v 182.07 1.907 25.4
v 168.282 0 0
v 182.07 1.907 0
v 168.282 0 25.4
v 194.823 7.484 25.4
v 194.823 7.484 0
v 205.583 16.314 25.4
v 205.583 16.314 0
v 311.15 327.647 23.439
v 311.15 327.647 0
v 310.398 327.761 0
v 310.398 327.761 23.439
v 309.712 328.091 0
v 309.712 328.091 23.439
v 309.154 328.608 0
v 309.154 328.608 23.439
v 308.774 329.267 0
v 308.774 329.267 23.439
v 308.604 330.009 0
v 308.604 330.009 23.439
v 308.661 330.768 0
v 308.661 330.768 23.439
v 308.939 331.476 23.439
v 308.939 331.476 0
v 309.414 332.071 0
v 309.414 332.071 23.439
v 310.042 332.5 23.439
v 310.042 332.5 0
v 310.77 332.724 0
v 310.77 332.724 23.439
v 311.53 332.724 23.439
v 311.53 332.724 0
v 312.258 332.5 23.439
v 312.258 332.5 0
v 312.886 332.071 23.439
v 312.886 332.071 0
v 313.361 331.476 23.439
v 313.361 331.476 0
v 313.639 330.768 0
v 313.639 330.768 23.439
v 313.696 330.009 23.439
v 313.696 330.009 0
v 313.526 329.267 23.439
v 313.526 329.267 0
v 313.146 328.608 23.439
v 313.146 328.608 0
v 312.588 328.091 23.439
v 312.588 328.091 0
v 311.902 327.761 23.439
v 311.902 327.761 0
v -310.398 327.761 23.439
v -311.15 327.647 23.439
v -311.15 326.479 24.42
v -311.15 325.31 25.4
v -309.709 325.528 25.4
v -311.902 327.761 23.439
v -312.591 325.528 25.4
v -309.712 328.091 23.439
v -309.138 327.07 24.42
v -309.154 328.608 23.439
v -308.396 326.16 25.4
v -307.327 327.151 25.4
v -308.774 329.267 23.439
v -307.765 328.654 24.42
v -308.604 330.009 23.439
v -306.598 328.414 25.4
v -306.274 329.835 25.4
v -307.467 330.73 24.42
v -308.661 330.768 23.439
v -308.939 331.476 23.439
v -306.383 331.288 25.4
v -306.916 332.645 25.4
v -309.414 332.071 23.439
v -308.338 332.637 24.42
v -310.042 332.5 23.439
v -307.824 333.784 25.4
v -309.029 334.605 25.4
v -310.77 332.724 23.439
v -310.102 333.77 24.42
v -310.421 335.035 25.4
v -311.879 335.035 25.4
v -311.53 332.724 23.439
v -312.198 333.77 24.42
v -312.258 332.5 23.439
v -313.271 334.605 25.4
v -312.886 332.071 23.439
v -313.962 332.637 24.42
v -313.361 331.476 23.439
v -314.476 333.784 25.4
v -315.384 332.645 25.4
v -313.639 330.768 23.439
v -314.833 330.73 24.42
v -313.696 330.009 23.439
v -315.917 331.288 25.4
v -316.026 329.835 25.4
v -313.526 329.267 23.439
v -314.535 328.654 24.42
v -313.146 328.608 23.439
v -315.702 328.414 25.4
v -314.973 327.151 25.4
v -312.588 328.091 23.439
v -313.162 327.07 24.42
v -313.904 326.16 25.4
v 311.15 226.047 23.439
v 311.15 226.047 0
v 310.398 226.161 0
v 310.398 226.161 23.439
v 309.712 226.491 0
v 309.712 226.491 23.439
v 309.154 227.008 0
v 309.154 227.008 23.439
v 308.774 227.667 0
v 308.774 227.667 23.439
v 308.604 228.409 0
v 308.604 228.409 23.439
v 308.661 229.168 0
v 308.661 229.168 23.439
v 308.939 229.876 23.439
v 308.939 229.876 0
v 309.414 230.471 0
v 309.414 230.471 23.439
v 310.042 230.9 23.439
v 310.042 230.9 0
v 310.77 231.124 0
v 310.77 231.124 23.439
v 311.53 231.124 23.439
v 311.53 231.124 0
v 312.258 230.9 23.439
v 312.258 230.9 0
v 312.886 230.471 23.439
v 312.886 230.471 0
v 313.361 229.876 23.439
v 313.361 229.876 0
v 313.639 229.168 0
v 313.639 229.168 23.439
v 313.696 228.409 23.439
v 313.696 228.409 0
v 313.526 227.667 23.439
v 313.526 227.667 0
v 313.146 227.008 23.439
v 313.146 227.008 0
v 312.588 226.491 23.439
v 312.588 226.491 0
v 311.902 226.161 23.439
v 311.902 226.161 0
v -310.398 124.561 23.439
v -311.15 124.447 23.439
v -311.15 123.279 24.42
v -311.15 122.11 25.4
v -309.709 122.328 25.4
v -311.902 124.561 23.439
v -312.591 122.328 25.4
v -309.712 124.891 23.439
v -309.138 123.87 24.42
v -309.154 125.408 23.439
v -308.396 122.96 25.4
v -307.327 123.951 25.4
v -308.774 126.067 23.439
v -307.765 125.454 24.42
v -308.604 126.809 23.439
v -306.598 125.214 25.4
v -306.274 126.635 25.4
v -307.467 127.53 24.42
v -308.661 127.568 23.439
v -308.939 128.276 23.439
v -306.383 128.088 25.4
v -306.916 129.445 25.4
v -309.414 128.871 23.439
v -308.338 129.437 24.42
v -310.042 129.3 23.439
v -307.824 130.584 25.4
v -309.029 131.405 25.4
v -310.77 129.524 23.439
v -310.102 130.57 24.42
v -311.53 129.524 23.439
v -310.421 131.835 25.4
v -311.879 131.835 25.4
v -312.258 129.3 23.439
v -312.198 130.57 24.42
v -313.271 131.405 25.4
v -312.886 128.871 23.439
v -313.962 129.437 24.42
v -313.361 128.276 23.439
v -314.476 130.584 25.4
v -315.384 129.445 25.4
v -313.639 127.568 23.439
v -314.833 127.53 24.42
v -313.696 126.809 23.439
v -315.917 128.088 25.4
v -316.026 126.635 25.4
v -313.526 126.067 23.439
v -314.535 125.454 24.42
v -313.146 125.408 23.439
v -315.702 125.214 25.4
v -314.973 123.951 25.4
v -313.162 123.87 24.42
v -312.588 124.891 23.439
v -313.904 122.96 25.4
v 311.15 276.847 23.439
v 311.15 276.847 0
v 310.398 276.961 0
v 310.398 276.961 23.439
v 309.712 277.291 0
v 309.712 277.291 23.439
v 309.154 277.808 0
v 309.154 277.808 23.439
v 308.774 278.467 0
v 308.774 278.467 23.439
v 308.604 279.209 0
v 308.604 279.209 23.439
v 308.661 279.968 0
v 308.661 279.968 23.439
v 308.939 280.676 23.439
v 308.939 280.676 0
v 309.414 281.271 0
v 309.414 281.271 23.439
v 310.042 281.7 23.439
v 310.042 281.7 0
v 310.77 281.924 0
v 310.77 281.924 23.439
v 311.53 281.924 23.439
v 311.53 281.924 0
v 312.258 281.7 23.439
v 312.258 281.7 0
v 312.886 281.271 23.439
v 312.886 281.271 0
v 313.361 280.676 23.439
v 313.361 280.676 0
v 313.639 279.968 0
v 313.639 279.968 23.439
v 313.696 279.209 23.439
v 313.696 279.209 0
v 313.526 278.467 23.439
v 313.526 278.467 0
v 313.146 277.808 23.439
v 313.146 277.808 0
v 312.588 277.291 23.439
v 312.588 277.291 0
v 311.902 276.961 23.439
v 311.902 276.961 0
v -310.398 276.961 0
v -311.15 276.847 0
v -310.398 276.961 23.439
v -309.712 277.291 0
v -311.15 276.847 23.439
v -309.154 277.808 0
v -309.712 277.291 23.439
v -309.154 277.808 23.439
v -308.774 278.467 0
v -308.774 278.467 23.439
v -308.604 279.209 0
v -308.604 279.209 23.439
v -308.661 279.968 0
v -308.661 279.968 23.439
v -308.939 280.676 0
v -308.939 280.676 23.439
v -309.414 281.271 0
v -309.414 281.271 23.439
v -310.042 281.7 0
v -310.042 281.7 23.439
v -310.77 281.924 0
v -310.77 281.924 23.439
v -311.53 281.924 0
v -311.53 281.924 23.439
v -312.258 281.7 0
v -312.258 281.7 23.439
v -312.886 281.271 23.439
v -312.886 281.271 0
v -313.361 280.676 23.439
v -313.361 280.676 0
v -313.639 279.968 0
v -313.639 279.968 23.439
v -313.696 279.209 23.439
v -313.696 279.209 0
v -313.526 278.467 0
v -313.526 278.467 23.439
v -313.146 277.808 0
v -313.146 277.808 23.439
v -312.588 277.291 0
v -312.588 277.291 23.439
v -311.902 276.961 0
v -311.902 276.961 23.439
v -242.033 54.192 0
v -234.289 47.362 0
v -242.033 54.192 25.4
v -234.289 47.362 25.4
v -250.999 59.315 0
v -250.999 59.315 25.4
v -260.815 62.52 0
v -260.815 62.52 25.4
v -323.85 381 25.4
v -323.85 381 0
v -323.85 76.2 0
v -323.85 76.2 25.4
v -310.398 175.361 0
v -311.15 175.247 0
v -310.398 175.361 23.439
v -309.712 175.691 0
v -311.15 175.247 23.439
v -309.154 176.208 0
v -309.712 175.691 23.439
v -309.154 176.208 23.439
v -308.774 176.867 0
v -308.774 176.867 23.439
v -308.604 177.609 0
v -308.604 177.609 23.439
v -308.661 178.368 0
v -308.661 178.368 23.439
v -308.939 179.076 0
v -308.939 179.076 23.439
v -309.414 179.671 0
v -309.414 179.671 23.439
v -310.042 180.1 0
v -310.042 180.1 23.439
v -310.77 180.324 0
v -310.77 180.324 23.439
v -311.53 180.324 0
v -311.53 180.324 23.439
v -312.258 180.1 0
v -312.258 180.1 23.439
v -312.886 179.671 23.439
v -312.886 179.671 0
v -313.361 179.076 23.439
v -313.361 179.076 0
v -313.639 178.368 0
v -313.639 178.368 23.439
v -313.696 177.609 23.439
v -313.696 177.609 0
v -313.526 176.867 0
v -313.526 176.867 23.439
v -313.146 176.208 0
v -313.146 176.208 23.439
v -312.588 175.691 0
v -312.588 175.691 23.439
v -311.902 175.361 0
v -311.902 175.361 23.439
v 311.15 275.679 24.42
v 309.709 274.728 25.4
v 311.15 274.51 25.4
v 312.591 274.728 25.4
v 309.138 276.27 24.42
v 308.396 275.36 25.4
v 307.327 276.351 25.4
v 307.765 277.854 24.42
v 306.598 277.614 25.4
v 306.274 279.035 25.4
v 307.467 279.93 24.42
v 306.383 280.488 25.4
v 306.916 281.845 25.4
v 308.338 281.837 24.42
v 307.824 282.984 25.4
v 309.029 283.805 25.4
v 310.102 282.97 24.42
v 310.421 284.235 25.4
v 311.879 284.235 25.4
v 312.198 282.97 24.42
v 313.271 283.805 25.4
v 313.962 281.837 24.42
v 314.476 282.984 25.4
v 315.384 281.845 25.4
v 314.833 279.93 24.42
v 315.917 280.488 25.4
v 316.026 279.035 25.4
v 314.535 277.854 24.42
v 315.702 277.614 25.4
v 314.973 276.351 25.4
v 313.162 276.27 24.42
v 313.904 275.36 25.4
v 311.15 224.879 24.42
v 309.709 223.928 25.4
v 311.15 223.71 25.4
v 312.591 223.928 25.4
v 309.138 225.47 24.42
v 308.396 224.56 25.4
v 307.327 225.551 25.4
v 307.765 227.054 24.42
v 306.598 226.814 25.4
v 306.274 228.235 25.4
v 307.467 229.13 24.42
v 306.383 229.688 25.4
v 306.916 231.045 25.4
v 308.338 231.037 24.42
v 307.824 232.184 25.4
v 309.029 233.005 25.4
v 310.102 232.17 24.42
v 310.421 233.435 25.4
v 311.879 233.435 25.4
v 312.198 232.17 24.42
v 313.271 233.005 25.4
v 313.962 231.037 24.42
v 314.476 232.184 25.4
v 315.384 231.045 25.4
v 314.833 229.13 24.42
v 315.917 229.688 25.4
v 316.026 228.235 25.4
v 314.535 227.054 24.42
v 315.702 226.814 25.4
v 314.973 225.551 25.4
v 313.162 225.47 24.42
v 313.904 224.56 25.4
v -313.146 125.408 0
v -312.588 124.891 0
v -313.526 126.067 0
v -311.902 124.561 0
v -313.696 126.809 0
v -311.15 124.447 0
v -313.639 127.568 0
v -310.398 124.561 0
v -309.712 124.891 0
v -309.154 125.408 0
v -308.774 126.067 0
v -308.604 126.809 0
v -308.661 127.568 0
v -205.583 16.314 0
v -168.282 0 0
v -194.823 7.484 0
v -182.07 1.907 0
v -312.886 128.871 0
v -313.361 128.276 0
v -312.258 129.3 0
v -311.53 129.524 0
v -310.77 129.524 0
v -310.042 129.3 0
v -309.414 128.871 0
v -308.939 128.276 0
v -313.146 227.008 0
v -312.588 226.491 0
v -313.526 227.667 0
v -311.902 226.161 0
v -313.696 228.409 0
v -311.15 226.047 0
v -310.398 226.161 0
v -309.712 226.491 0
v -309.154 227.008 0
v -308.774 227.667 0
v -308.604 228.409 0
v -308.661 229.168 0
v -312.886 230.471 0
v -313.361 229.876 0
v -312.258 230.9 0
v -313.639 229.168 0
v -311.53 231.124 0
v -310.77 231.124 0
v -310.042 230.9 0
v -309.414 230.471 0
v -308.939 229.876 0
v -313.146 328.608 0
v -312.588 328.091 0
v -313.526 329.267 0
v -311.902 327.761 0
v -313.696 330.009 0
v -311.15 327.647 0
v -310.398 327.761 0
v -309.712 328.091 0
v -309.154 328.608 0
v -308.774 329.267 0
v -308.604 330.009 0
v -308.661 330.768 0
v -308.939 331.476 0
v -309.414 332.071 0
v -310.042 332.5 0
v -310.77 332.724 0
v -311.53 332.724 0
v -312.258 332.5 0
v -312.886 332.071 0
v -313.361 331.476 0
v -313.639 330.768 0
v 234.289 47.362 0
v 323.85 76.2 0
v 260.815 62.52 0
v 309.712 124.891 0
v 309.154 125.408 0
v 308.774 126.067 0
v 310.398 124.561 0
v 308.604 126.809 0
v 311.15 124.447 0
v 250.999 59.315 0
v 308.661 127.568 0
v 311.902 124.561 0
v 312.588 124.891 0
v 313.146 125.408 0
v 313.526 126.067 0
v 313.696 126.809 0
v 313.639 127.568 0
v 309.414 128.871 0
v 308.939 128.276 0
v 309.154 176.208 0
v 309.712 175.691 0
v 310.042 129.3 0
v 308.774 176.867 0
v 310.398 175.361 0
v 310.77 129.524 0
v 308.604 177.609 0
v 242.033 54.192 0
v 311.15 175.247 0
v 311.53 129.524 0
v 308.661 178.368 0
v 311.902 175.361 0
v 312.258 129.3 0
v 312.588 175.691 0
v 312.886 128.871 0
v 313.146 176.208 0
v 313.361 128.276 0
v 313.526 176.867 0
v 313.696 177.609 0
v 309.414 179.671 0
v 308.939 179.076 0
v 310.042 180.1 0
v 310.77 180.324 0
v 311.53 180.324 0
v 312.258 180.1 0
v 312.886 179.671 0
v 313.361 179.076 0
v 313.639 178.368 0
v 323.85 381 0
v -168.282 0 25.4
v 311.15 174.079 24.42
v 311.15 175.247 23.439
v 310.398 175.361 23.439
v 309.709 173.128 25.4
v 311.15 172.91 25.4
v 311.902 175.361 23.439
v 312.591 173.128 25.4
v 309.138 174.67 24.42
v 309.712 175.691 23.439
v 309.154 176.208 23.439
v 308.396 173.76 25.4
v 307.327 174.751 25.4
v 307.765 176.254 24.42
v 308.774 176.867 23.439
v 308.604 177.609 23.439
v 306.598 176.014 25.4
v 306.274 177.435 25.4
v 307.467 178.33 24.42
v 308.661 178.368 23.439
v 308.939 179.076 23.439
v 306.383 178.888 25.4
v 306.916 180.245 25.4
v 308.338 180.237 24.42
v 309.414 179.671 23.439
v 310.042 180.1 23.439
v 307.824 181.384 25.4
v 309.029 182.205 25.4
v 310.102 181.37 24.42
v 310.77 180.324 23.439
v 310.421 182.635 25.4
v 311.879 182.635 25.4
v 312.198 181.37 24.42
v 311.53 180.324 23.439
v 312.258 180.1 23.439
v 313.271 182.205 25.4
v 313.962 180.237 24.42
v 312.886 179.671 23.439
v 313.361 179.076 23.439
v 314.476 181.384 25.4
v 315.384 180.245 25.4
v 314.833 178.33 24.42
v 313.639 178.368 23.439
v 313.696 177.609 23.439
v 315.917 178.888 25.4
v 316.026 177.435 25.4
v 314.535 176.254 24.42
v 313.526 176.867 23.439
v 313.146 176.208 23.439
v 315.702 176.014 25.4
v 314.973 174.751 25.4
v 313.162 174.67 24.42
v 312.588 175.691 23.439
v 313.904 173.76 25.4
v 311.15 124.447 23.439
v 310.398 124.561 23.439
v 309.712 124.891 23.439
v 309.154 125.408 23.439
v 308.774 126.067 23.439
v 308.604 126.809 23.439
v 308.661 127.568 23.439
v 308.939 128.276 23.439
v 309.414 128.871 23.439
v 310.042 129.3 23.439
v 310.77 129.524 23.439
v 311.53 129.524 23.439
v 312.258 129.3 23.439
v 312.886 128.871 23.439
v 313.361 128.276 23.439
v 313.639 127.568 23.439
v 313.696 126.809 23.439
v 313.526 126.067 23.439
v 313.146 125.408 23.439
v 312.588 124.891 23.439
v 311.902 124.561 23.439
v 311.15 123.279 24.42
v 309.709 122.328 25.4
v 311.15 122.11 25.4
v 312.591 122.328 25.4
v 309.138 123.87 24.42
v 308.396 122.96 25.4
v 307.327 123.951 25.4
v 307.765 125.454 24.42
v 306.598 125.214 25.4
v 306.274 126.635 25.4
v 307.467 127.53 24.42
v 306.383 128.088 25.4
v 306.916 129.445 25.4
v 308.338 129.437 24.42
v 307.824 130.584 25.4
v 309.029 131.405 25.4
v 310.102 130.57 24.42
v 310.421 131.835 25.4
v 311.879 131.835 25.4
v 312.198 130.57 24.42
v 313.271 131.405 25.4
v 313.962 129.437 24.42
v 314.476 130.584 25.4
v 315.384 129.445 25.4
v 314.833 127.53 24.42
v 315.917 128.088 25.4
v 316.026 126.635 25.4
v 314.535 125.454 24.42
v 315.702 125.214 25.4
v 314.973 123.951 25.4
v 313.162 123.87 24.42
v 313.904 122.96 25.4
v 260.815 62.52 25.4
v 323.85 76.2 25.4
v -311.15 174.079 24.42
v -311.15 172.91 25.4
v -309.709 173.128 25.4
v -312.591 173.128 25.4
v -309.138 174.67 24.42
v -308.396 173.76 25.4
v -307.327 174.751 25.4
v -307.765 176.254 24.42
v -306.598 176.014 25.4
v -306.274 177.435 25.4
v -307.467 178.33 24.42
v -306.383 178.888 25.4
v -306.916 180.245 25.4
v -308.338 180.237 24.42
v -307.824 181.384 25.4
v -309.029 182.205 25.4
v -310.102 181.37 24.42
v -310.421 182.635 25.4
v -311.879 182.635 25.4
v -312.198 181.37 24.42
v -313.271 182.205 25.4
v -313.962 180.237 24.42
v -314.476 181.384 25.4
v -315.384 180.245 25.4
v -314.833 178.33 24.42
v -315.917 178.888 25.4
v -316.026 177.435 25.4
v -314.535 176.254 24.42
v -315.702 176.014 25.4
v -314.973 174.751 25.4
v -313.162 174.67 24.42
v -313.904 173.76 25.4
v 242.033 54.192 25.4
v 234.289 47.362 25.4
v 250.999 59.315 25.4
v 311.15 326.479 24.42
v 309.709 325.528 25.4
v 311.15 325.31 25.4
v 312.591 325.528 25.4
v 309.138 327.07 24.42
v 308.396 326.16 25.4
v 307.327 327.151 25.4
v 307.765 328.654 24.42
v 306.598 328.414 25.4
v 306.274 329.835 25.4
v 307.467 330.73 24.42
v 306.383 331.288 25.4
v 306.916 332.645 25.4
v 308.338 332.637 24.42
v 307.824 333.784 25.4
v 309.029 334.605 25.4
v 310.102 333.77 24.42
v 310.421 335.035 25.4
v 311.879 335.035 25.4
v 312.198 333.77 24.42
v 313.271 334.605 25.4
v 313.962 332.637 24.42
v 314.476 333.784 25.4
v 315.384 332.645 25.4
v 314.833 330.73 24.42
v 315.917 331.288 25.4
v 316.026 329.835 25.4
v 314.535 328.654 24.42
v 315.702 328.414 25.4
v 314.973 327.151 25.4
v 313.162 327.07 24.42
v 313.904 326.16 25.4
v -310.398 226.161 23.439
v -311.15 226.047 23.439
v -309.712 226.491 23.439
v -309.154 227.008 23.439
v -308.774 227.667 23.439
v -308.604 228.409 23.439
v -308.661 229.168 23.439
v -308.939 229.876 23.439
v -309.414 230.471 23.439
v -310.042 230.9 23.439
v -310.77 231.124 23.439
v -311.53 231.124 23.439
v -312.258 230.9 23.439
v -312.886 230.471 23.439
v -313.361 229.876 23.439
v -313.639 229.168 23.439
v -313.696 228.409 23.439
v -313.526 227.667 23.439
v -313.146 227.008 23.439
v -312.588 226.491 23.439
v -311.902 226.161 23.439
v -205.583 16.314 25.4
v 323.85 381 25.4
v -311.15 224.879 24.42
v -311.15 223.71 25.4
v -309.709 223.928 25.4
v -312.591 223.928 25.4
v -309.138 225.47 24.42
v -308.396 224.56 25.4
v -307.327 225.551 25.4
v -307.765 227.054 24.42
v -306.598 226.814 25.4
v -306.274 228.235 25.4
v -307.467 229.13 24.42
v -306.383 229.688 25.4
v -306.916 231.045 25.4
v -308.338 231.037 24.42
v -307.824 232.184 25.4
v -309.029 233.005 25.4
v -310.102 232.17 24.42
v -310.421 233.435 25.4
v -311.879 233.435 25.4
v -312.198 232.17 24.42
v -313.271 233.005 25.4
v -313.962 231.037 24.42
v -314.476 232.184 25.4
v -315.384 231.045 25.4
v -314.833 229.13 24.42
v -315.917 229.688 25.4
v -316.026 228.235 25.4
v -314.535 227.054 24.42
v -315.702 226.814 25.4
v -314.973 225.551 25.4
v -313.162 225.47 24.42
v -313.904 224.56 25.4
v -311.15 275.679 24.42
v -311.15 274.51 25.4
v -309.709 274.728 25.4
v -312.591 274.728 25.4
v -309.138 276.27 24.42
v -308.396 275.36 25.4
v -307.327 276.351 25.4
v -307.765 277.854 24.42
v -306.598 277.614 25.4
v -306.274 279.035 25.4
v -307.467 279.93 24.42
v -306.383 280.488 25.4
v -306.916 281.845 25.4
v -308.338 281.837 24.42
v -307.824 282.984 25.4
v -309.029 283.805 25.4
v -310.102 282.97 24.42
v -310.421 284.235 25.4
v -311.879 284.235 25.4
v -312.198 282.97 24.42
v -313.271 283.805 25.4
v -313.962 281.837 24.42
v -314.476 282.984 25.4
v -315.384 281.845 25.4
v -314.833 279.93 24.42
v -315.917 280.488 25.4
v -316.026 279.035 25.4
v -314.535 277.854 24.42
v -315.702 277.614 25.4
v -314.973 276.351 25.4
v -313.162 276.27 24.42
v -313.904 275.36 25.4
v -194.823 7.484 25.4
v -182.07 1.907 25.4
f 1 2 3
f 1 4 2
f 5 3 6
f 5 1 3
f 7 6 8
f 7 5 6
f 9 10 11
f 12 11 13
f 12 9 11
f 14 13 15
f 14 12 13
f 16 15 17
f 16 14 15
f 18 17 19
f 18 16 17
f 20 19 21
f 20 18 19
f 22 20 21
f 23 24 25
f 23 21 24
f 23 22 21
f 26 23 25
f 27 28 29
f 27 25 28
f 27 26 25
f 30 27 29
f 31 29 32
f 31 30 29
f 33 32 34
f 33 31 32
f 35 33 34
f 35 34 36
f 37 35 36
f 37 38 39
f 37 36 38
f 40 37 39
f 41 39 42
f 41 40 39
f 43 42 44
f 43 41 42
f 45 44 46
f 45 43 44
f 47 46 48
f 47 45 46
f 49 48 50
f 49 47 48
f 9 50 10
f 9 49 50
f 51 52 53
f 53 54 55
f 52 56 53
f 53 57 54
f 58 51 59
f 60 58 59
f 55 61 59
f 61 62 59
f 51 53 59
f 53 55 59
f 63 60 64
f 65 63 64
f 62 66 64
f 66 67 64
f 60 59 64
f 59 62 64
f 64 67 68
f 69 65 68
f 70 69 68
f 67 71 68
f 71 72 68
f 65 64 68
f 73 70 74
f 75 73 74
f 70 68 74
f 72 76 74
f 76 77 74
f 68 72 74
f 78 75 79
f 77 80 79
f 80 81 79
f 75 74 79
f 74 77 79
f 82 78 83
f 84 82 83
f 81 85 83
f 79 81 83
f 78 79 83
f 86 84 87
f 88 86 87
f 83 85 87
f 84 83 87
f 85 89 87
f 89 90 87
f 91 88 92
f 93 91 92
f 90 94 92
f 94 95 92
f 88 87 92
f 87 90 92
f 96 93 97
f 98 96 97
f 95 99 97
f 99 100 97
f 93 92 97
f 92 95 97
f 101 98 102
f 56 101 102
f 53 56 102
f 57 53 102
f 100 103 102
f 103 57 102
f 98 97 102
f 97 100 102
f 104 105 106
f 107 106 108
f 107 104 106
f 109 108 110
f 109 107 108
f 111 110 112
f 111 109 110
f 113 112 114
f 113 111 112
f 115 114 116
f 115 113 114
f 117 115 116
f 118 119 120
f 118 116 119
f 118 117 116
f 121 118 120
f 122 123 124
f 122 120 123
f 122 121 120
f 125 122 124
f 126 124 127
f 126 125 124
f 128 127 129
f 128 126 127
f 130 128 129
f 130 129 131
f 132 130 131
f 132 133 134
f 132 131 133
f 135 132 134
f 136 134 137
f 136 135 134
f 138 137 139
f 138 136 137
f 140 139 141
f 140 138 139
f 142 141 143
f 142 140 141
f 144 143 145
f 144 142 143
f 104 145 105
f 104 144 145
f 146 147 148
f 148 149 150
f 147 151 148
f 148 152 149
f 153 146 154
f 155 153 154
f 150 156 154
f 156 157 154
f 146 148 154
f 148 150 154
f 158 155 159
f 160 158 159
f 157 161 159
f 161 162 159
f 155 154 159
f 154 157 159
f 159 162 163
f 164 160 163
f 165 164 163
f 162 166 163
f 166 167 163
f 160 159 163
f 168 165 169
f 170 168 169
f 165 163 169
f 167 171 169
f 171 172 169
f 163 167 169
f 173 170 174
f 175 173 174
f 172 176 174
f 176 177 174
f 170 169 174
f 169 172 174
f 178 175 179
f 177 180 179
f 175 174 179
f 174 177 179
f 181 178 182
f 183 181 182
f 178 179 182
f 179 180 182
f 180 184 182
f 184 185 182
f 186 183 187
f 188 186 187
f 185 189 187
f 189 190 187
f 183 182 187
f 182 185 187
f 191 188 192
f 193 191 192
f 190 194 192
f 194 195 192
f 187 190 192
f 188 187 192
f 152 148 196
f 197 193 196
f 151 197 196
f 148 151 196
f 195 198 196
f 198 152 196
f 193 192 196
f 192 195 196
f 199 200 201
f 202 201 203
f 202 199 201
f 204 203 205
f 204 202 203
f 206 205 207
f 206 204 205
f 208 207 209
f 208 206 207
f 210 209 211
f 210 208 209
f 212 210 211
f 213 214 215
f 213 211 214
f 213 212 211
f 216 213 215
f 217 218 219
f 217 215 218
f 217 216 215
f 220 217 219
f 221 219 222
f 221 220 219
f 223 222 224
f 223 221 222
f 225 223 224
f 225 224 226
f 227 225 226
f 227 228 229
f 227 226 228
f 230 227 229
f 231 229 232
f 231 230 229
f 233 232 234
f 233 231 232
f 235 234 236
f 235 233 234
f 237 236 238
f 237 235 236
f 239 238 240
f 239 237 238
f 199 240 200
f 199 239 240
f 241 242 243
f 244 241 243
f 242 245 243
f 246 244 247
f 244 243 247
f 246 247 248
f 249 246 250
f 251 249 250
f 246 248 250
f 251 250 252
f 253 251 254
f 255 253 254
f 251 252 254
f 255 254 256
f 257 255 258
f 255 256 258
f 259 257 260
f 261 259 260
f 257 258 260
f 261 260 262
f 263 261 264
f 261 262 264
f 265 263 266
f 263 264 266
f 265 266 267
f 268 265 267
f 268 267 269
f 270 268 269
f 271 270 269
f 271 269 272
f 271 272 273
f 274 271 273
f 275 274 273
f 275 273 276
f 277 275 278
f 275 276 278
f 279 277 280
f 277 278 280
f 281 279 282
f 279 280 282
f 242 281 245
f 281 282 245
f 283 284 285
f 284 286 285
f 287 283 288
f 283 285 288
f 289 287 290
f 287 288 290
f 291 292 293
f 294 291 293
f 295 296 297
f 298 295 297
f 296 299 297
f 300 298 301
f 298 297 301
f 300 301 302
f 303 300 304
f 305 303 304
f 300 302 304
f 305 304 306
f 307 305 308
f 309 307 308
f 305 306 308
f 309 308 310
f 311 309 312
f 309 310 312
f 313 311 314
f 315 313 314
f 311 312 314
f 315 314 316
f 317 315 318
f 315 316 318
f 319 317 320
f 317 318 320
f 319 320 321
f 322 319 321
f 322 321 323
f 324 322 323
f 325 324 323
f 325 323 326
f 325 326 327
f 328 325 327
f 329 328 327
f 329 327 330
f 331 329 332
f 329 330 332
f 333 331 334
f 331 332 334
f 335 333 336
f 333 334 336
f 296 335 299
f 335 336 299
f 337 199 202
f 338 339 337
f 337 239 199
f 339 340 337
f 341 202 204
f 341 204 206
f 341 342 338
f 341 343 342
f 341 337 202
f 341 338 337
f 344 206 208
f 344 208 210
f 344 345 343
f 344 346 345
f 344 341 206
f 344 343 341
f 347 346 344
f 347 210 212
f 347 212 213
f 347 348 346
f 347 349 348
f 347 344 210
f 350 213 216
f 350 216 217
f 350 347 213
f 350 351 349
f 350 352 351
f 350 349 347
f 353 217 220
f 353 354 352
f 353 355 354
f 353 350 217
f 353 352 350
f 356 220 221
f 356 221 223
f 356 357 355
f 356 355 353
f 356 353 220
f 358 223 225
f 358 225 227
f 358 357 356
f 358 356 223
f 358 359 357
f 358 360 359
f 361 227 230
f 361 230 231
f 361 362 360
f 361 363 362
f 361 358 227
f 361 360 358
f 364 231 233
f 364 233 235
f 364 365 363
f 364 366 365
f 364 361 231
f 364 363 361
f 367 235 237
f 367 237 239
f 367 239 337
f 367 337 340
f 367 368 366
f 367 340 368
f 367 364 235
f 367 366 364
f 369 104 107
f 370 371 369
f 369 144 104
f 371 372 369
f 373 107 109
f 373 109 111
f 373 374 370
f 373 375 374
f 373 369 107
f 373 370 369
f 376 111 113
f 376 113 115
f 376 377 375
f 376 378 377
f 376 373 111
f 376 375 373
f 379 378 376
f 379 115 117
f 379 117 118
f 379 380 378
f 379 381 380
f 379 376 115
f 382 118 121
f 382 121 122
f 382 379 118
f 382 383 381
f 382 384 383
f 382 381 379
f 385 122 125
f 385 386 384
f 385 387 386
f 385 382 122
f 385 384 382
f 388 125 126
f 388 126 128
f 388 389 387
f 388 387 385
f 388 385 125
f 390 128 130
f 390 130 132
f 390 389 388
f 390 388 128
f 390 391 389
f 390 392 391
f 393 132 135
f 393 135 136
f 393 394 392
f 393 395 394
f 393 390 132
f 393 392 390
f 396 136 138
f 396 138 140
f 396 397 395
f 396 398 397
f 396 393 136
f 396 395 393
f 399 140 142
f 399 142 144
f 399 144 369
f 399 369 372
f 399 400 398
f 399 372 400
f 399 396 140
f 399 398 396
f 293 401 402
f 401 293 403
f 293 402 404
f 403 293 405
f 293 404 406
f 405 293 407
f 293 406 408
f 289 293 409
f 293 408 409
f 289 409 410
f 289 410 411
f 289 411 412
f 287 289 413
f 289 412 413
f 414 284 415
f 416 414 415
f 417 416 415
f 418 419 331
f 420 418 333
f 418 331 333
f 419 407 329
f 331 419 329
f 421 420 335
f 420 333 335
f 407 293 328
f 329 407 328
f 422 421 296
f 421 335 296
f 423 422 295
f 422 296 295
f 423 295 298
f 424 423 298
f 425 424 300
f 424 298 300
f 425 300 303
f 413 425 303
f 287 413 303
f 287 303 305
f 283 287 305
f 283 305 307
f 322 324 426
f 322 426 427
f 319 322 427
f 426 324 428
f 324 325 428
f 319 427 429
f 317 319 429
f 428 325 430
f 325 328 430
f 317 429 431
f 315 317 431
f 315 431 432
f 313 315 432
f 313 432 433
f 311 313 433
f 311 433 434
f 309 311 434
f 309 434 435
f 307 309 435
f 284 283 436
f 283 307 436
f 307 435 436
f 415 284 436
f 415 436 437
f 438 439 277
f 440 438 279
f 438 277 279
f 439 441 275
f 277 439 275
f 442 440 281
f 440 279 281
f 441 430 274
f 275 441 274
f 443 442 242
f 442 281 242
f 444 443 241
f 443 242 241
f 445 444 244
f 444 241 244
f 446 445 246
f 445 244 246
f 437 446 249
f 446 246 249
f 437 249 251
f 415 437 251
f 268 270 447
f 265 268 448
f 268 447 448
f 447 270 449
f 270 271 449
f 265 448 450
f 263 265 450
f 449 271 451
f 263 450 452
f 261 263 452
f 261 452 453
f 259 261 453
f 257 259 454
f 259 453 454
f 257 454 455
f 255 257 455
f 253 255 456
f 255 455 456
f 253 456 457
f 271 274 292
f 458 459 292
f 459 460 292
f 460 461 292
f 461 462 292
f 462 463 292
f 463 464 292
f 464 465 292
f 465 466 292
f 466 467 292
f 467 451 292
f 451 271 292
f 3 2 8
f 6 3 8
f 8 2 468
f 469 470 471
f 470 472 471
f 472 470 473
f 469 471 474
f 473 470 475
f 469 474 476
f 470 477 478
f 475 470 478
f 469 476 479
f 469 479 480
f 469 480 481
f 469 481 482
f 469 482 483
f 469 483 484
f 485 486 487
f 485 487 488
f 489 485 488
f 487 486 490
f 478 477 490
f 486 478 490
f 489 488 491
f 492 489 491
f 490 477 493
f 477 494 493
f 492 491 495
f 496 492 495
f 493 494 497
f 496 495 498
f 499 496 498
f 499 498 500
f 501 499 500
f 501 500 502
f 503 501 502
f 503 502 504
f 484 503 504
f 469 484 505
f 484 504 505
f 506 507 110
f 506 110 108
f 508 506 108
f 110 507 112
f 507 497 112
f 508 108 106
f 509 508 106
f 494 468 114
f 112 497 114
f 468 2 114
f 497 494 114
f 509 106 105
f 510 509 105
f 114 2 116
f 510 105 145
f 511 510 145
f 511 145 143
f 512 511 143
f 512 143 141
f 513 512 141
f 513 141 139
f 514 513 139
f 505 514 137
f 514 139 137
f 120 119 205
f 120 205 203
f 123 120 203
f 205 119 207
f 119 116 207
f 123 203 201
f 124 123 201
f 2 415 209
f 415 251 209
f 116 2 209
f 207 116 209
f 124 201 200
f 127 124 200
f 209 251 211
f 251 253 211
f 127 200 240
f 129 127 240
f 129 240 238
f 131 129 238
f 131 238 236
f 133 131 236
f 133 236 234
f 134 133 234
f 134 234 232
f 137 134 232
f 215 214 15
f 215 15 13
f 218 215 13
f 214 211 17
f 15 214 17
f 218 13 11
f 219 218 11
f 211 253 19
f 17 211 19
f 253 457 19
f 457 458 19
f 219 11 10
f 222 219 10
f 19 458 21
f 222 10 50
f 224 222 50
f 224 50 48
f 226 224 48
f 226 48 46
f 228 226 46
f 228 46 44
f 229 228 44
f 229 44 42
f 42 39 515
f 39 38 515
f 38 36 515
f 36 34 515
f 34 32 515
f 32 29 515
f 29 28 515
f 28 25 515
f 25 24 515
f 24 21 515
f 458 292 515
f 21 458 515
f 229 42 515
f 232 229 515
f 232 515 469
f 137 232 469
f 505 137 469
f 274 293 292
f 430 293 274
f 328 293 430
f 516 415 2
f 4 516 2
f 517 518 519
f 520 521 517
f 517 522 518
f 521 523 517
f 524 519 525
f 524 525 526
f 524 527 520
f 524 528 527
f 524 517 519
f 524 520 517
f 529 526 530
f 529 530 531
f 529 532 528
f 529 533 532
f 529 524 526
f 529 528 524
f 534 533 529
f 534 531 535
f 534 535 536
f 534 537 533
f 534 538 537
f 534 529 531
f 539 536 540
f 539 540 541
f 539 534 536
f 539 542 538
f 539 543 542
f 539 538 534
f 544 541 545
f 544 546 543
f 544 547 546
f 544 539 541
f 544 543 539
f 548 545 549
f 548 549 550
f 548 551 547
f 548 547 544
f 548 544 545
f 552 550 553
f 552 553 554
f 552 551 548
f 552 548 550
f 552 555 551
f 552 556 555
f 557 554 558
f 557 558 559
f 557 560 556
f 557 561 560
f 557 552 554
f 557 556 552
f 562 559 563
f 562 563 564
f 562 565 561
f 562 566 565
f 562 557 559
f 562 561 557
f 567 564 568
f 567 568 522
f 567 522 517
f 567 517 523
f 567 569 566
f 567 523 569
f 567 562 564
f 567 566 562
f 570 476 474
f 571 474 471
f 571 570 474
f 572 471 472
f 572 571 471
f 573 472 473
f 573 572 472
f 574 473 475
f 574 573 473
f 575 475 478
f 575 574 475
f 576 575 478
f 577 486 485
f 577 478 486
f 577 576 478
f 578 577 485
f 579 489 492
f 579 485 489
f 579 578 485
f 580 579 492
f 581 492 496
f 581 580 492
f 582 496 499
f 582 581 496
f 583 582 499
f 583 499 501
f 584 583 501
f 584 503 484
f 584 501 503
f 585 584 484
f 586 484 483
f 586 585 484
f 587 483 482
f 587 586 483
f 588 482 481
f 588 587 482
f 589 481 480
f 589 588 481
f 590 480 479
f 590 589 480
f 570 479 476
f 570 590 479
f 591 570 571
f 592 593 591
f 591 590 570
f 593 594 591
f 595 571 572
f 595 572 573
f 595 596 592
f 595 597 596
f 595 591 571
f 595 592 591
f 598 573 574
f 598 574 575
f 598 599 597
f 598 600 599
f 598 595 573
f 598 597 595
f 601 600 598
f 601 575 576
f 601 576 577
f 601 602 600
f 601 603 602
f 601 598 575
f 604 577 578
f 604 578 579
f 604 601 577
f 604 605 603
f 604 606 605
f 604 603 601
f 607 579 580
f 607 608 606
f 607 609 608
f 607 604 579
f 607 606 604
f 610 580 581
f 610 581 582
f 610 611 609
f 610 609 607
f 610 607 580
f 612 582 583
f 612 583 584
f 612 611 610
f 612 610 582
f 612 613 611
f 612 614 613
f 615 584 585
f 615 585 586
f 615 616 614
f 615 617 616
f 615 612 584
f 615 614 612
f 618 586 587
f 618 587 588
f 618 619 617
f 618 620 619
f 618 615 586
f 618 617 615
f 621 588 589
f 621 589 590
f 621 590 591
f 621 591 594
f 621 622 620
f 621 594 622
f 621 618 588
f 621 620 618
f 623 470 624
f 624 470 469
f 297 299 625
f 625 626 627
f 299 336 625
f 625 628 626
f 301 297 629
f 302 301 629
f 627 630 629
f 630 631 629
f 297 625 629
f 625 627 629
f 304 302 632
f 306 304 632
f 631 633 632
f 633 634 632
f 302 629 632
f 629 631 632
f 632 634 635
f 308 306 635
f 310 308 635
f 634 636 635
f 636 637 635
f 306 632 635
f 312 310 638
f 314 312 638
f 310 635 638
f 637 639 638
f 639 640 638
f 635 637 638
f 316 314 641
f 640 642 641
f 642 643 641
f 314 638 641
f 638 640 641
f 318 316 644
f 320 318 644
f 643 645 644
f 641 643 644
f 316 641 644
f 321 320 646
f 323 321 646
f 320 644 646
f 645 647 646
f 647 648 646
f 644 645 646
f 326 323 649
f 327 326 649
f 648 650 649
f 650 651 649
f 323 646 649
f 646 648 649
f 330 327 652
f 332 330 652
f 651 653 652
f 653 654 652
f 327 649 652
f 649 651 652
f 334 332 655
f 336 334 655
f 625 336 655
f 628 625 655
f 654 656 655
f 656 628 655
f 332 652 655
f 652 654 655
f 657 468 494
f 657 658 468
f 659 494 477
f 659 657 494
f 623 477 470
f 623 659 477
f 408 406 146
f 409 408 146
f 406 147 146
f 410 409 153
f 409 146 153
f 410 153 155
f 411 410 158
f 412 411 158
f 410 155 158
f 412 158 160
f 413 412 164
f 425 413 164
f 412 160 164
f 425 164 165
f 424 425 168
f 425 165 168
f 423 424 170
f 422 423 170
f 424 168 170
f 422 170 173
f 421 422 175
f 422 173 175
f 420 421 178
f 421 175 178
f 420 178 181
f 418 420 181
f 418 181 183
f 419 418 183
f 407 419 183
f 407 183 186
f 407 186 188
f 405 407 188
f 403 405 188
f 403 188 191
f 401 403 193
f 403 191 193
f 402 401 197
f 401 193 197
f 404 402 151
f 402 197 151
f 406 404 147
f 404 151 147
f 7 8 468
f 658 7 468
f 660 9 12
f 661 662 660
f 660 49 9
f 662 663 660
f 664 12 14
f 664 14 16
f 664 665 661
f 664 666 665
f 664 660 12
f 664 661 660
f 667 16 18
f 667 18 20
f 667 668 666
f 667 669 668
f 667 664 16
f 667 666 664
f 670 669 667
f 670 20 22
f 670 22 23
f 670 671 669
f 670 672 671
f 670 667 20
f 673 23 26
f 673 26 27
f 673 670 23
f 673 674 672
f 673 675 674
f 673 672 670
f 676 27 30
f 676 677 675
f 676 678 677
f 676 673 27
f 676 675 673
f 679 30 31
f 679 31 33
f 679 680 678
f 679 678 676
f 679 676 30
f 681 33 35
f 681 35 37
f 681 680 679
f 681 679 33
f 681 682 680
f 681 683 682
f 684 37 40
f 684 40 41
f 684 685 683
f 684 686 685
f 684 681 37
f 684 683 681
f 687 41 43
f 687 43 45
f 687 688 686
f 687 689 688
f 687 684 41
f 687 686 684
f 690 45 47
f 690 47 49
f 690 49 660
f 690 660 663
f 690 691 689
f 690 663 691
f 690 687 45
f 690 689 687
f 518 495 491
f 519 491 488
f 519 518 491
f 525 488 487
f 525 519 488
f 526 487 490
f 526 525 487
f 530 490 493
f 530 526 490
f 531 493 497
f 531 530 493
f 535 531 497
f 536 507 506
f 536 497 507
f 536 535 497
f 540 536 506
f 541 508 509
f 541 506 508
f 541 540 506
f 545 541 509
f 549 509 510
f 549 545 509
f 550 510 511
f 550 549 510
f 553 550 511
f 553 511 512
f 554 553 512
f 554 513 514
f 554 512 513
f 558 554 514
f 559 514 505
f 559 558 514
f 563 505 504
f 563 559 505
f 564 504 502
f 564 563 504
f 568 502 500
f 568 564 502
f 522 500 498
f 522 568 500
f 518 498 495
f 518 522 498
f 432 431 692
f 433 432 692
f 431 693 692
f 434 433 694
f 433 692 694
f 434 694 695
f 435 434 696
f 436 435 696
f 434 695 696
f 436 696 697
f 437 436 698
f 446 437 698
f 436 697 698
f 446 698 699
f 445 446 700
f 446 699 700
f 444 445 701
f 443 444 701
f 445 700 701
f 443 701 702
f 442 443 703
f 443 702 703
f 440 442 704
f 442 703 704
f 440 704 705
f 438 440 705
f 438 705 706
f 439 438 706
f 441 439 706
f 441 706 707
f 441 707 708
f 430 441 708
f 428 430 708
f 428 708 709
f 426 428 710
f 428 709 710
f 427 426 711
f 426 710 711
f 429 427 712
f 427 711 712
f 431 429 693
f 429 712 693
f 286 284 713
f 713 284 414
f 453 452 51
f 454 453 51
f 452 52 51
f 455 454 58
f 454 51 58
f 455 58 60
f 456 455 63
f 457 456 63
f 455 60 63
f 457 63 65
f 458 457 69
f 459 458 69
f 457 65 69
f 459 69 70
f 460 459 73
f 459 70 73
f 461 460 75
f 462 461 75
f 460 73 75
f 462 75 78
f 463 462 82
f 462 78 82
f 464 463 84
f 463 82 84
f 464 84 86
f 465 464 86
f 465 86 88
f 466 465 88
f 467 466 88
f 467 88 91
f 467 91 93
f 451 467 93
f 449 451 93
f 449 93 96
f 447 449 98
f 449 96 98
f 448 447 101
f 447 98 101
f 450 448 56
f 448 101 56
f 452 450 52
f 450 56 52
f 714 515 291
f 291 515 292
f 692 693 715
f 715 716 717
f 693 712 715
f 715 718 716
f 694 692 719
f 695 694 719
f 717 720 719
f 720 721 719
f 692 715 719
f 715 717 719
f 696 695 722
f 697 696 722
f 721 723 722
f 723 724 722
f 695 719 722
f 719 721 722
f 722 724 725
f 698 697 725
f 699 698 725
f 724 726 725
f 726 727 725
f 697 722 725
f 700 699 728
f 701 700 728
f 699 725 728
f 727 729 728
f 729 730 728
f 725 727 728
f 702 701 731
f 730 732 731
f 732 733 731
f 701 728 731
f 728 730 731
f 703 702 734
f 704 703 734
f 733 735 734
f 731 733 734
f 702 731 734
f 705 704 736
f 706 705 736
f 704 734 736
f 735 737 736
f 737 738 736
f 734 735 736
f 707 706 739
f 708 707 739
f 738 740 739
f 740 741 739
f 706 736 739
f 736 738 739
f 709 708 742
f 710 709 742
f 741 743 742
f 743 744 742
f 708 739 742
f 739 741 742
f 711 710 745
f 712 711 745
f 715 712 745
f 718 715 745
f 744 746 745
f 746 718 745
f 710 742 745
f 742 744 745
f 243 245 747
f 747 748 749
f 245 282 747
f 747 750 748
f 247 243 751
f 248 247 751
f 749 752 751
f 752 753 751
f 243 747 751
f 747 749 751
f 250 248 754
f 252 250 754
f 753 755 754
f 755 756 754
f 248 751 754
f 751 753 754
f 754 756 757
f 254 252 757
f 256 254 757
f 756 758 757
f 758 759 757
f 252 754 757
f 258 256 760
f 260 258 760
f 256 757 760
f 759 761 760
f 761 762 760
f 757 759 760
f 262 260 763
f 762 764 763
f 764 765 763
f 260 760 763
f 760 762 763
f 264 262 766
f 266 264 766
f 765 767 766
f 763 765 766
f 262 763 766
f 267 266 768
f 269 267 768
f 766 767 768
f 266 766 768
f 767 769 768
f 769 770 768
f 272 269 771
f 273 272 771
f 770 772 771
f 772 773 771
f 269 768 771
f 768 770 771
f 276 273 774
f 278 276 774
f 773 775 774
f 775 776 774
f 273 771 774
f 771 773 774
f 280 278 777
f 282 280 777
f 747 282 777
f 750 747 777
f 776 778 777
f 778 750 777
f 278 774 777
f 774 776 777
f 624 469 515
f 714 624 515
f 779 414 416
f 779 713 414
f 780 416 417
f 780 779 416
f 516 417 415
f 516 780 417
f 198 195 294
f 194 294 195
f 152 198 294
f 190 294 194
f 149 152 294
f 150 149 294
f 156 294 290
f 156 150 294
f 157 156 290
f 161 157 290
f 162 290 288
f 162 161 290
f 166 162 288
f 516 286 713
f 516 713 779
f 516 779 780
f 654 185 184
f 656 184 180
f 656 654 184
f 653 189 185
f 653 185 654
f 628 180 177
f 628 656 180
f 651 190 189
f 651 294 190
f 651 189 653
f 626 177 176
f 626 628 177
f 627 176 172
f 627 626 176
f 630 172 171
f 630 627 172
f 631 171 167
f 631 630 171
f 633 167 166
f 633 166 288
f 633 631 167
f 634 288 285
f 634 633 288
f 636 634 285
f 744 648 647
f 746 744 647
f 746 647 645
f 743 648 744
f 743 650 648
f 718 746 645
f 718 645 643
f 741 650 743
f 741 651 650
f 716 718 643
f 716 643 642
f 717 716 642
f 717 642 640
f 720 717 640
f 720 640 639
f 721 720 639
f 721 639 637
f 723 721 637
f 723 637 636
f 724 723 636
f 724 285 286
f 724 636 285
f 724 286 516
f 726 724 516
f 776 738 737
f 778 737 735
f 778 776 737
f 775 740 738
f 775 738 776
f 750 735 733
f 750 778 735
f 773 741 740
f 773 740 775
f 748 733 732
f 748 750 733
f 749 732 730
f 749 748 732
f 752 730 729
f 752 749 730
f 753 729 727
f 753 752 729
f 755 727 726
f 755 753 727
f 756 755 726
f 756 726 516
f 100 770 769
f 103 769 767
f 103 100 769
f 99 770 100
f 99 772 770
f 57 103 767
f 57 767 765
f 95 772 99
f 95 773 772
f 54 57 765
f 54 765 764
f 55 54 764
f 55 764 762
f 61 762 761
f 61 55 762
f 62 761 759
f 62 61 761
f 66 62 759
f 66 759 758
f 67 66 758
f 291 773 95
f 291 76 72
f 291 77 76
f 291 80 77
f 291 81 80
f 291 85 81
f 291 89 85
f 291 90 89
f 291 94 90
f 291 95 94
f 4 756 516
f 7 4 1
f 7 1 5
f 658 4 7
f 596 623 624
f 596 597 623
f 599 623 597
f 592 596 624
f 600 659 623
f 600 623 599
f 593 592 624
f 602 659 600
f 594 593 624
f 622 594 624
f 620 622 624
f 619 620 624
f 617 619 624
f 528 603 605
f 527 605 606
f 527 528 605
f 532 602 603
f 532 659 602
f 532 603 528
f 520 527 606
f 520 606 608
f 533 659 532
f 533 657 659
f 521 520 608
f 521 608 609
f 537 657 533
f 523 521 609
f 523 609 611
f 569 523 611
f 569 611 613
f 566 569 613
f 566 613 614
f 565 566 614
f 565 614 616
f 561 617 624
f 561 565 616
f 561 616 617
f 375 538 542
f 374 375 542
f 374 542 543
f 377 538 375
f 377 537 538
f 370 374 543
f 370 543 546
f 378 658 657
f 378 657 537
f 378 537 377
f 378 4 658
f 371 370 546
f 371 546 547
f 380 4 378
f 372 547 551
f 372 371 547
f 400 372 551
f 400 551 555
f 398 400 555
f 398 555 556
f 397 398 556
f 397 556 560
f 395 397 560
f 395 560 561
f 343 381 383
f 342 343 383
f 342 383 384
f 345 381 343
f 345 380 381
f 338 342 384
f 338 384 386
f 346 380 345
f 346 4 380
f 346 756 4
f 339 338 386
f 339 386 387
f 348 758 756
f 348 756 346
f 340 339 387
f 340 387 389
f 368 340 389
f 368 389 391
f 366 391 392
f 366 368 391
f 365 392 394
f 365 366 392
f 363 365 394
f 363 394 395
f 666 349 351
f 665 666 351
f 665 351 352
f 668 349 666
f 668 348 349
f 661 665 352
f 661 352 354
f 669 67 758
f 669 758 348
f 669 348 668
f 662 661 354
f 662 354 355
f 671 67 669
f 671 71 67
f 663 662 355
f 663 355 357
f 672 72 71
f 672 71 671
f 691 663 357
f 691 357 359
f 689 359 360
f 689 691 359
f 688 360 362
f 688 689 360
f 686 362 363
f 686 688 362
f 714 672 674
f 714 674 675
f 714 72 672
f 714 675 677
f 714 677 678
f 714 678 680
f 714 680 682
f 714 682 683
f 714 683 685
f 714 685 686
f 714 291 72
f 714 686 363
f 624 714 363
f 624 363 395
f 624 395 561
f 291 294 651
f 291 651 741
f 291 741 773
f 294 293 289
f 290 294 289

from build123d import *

# Parameters (mm, degrees)
BOSS_EXTRUDE1_DEPTH                        = 25.4
FILLET1_R                                  = 50.8
CSK_FOR_10_FLAT_HEAD_MACHINE_SCREW_2_COUNT = 2
CSK_FOR_10_FLAT_HEAD_MACHINE_SCREW_2_PITCH = 50.8
CSK_FOR_10_FLAT_HEAD_MACHINE_SCREW_3_COUNT = 2
CSK_FOR_10_FLAT_HEAD_MACHINE_SCREW_3_PITCH = 101.6
CSK_FOR_10_FLAT_HEAD_MACHINE_SCREW_4_COUNT = 2
CSK_FOR_10_FLAT_HEAD_MACHINE_SCREW_4_PITCH = 152.4
CSK_FOR_10_FLAT_HEAD_MACHINE_SCREW_5_COUNT = 2
CSK_FOR_10_FLAT_HEAD_MACHINE_SCREW_5_PITCH = 203.2


with BuildPart() as part:
    # Sketch1 → Boss-Extrude1 (new body)
    with BuildSketch(Plane.XY):
        Polygon((-245.162116144, 59.122546749), (-190.5, 0), (190.5, 0), (245.162116144, 59.122546749), (323.85, 76.2), (323.85, 381), (-323.85, 381), (-323.85, 76.2), align=None)
    extrude(amount=BOSS_EXTRUDE1_DEPTH)

    # Fillet1
    fillet1_edges = [part.edges().sort_by_distance(p)[0] for p in [
        (245.162116144, 59.122546749, 12.7),
        (190.5, 0, 12.7),
        (-190.5, 0, 12.7),
        (-245.162116144, 59.122546749, 12.7),
    ]]
    fillet(fillet1_edges, radius=FILLET1_R)

    # Sketch4 → CSK for #10 Flat Head Machine Screw (100)1 (revolve, cut)
    with BuildSketch(Plane(origin=(311.15, 330.2, 25.4), x_dir=(0, -1, 0), z_dir=(1, 0, 0))):
        Polygon((0, 0), (0, 52.333816902), (2.5527, 50.8), (2.5527, 1.960808018), (4.8895, 0), align=None)
    csk_for_10_flat_head_machine_screw_100 = revolve(axis=Axis((311.15, 330.2, 31.75), (0, 0, -1)), mode=Mode.SUBTRACT)

    # CSK for _10 Flat Head Machine Screw  2: CSK for #10 Flat Head Machine Screw (100)1 ×2
    with Locations(*[(0, -i * CSK_FOR_10_FLAT_HEAD_MACHINE_SCREW_2_PITCH, 0) for i in range(1, CSK_FOR_10_FLAT_HEAD_MACHINE_SCREW_2_COUNT)]):
        add(csk_for_10_flat_head_machine_screw_100, mode=Mode.SUBTRACT)

    # CSK for _10 Flat Head Machine Screw  3: CSK for #10 Flat Head Machine Screw (100)1 ×2
    with Locations(*[(0, -i * CSK_FOR_10_FLAT_HEAD_MACHINE_SCREW_3_PITCH, 0) for i in range(1, CSK_FOR_10_FLAT_HEAD_MACHINE_SCREW_3_COUNT)]):
        add(csk_for_10_flat_head_machine_screw_100, mode=Mode.SUBTRACT)

    # CSK for _10 Flat Head Machine Screw  4: CSK for #10 Flat Head Machine Screw (100)1 ×2
    with Locations(*[(0, -i * CSK_FOR_10_FLAT_HEAD_MACHINE_SCREW_4_PITCH, 0) for i in range(1, CSK_FOR_10_FLAT_HEAD_MACHINE_SCREW_4_COUNT)]):
        add(csk_for_10_flat_head_machine_screw_100, mode=Mode.SUBTRACT)

    # CSK for _10 Flat Head Machine Screw  5: CSK for #10 Flat Head Machine Screw (100)1 ×2
    with Locations(*[(0, -i * CSK_FOR_10_FLAT_HEAD_MACHINE_SCREW_5_PITCH, 0) for i in range(1, CSK_FOR_10_FLAT_HEAD_MACHINE_SCREW_5_COUNT)]):
        add(csk_for_10_flat_head_machine_screw_100, mode=Mode.SUBTRACT)

    # Mirror1: CSK for #10 Flat Head Machine Screw (100)1 across plane
    add(csk_for_10_flat_head_machine_screw_100.mirror(Plane(origin=(0, 0, 0), x_dir=(0, 0, 1), z_dir=(1, 0, 0))), mode=Mode.SUBTRACT)

    # Mirror1 copy 1 sketch → Mirror1 copy 1 (revolve, cut)
    with BuildSketch(Plane(origin=(-311.15, 279.4, 25.4), x_dir=(0, -1, 0), z_dir=(-1, 0, 0))):
        Polygon((0, 0), (0, -52.333816902), (2.5527, -50.8), (2.5527, -1.960808018), (4.8895, 0), align=None)
    revolve(axis=Axis((-311.15, 279.4, 31.75), (0, 0, 1)), mode=Mode.SUBTRACT)

    # Mirror1 copy 2 sketch → Mirror1 copy 2 (revolve, cut)
    with BuildSketch(Plane(origin=(-311.15, 228.6, 25.4), x_dir=(0, -1, 0), z_dir=(-1, 0, 0))):
        Polygon((0, 0), (0, -52.333816902), (2.5527, -50.8), (2.5527, -1.960808018), (4.8895, 0), align=None)
    revolve(axis=Axis((-311.15, 228.6, 31.75), (0, 0, 1)), mode=Mode.SUBTRACT)

    # Mirror1 copy 3 sketch → Mirror1 copy 3 (revolve, cut)
    with BuildSketch(Plane(origin=(-311.15, 177.8, 25.4), x_dir=(0, -1, 0), z_dir=(-1, 0, 0))):
        Polygon((0, 0), (0, -52.333816902), (2.5527, -50.8), (2.5527, -1.960808018), (4.8895, 0), align=None)
    revolve(axis=Axis((-311.15, 177.8, 31.75), (0, 0, 1)), mode=Mode.SUBTRACT)

    # Mirror1 copy 4 sketch → Mirror1 copy 4 (revolve, cut)
    with BuildSketch(Plane(origin=(-311.15, 127, 25.4), x_dir=(0, -1, 0), z_dir=(-1, 0, 0))):
        Polygon((0, 0), (0, -52.333816902), (2.5527, -50.8), (2.5527, -1.960808018), (4.8895, 0), align=None)
    revolve(axis=Axis((-311.15, 127, 31.75), (0, 0, 1)), mode=Mode.SUBTRACT)


solid = part.part
